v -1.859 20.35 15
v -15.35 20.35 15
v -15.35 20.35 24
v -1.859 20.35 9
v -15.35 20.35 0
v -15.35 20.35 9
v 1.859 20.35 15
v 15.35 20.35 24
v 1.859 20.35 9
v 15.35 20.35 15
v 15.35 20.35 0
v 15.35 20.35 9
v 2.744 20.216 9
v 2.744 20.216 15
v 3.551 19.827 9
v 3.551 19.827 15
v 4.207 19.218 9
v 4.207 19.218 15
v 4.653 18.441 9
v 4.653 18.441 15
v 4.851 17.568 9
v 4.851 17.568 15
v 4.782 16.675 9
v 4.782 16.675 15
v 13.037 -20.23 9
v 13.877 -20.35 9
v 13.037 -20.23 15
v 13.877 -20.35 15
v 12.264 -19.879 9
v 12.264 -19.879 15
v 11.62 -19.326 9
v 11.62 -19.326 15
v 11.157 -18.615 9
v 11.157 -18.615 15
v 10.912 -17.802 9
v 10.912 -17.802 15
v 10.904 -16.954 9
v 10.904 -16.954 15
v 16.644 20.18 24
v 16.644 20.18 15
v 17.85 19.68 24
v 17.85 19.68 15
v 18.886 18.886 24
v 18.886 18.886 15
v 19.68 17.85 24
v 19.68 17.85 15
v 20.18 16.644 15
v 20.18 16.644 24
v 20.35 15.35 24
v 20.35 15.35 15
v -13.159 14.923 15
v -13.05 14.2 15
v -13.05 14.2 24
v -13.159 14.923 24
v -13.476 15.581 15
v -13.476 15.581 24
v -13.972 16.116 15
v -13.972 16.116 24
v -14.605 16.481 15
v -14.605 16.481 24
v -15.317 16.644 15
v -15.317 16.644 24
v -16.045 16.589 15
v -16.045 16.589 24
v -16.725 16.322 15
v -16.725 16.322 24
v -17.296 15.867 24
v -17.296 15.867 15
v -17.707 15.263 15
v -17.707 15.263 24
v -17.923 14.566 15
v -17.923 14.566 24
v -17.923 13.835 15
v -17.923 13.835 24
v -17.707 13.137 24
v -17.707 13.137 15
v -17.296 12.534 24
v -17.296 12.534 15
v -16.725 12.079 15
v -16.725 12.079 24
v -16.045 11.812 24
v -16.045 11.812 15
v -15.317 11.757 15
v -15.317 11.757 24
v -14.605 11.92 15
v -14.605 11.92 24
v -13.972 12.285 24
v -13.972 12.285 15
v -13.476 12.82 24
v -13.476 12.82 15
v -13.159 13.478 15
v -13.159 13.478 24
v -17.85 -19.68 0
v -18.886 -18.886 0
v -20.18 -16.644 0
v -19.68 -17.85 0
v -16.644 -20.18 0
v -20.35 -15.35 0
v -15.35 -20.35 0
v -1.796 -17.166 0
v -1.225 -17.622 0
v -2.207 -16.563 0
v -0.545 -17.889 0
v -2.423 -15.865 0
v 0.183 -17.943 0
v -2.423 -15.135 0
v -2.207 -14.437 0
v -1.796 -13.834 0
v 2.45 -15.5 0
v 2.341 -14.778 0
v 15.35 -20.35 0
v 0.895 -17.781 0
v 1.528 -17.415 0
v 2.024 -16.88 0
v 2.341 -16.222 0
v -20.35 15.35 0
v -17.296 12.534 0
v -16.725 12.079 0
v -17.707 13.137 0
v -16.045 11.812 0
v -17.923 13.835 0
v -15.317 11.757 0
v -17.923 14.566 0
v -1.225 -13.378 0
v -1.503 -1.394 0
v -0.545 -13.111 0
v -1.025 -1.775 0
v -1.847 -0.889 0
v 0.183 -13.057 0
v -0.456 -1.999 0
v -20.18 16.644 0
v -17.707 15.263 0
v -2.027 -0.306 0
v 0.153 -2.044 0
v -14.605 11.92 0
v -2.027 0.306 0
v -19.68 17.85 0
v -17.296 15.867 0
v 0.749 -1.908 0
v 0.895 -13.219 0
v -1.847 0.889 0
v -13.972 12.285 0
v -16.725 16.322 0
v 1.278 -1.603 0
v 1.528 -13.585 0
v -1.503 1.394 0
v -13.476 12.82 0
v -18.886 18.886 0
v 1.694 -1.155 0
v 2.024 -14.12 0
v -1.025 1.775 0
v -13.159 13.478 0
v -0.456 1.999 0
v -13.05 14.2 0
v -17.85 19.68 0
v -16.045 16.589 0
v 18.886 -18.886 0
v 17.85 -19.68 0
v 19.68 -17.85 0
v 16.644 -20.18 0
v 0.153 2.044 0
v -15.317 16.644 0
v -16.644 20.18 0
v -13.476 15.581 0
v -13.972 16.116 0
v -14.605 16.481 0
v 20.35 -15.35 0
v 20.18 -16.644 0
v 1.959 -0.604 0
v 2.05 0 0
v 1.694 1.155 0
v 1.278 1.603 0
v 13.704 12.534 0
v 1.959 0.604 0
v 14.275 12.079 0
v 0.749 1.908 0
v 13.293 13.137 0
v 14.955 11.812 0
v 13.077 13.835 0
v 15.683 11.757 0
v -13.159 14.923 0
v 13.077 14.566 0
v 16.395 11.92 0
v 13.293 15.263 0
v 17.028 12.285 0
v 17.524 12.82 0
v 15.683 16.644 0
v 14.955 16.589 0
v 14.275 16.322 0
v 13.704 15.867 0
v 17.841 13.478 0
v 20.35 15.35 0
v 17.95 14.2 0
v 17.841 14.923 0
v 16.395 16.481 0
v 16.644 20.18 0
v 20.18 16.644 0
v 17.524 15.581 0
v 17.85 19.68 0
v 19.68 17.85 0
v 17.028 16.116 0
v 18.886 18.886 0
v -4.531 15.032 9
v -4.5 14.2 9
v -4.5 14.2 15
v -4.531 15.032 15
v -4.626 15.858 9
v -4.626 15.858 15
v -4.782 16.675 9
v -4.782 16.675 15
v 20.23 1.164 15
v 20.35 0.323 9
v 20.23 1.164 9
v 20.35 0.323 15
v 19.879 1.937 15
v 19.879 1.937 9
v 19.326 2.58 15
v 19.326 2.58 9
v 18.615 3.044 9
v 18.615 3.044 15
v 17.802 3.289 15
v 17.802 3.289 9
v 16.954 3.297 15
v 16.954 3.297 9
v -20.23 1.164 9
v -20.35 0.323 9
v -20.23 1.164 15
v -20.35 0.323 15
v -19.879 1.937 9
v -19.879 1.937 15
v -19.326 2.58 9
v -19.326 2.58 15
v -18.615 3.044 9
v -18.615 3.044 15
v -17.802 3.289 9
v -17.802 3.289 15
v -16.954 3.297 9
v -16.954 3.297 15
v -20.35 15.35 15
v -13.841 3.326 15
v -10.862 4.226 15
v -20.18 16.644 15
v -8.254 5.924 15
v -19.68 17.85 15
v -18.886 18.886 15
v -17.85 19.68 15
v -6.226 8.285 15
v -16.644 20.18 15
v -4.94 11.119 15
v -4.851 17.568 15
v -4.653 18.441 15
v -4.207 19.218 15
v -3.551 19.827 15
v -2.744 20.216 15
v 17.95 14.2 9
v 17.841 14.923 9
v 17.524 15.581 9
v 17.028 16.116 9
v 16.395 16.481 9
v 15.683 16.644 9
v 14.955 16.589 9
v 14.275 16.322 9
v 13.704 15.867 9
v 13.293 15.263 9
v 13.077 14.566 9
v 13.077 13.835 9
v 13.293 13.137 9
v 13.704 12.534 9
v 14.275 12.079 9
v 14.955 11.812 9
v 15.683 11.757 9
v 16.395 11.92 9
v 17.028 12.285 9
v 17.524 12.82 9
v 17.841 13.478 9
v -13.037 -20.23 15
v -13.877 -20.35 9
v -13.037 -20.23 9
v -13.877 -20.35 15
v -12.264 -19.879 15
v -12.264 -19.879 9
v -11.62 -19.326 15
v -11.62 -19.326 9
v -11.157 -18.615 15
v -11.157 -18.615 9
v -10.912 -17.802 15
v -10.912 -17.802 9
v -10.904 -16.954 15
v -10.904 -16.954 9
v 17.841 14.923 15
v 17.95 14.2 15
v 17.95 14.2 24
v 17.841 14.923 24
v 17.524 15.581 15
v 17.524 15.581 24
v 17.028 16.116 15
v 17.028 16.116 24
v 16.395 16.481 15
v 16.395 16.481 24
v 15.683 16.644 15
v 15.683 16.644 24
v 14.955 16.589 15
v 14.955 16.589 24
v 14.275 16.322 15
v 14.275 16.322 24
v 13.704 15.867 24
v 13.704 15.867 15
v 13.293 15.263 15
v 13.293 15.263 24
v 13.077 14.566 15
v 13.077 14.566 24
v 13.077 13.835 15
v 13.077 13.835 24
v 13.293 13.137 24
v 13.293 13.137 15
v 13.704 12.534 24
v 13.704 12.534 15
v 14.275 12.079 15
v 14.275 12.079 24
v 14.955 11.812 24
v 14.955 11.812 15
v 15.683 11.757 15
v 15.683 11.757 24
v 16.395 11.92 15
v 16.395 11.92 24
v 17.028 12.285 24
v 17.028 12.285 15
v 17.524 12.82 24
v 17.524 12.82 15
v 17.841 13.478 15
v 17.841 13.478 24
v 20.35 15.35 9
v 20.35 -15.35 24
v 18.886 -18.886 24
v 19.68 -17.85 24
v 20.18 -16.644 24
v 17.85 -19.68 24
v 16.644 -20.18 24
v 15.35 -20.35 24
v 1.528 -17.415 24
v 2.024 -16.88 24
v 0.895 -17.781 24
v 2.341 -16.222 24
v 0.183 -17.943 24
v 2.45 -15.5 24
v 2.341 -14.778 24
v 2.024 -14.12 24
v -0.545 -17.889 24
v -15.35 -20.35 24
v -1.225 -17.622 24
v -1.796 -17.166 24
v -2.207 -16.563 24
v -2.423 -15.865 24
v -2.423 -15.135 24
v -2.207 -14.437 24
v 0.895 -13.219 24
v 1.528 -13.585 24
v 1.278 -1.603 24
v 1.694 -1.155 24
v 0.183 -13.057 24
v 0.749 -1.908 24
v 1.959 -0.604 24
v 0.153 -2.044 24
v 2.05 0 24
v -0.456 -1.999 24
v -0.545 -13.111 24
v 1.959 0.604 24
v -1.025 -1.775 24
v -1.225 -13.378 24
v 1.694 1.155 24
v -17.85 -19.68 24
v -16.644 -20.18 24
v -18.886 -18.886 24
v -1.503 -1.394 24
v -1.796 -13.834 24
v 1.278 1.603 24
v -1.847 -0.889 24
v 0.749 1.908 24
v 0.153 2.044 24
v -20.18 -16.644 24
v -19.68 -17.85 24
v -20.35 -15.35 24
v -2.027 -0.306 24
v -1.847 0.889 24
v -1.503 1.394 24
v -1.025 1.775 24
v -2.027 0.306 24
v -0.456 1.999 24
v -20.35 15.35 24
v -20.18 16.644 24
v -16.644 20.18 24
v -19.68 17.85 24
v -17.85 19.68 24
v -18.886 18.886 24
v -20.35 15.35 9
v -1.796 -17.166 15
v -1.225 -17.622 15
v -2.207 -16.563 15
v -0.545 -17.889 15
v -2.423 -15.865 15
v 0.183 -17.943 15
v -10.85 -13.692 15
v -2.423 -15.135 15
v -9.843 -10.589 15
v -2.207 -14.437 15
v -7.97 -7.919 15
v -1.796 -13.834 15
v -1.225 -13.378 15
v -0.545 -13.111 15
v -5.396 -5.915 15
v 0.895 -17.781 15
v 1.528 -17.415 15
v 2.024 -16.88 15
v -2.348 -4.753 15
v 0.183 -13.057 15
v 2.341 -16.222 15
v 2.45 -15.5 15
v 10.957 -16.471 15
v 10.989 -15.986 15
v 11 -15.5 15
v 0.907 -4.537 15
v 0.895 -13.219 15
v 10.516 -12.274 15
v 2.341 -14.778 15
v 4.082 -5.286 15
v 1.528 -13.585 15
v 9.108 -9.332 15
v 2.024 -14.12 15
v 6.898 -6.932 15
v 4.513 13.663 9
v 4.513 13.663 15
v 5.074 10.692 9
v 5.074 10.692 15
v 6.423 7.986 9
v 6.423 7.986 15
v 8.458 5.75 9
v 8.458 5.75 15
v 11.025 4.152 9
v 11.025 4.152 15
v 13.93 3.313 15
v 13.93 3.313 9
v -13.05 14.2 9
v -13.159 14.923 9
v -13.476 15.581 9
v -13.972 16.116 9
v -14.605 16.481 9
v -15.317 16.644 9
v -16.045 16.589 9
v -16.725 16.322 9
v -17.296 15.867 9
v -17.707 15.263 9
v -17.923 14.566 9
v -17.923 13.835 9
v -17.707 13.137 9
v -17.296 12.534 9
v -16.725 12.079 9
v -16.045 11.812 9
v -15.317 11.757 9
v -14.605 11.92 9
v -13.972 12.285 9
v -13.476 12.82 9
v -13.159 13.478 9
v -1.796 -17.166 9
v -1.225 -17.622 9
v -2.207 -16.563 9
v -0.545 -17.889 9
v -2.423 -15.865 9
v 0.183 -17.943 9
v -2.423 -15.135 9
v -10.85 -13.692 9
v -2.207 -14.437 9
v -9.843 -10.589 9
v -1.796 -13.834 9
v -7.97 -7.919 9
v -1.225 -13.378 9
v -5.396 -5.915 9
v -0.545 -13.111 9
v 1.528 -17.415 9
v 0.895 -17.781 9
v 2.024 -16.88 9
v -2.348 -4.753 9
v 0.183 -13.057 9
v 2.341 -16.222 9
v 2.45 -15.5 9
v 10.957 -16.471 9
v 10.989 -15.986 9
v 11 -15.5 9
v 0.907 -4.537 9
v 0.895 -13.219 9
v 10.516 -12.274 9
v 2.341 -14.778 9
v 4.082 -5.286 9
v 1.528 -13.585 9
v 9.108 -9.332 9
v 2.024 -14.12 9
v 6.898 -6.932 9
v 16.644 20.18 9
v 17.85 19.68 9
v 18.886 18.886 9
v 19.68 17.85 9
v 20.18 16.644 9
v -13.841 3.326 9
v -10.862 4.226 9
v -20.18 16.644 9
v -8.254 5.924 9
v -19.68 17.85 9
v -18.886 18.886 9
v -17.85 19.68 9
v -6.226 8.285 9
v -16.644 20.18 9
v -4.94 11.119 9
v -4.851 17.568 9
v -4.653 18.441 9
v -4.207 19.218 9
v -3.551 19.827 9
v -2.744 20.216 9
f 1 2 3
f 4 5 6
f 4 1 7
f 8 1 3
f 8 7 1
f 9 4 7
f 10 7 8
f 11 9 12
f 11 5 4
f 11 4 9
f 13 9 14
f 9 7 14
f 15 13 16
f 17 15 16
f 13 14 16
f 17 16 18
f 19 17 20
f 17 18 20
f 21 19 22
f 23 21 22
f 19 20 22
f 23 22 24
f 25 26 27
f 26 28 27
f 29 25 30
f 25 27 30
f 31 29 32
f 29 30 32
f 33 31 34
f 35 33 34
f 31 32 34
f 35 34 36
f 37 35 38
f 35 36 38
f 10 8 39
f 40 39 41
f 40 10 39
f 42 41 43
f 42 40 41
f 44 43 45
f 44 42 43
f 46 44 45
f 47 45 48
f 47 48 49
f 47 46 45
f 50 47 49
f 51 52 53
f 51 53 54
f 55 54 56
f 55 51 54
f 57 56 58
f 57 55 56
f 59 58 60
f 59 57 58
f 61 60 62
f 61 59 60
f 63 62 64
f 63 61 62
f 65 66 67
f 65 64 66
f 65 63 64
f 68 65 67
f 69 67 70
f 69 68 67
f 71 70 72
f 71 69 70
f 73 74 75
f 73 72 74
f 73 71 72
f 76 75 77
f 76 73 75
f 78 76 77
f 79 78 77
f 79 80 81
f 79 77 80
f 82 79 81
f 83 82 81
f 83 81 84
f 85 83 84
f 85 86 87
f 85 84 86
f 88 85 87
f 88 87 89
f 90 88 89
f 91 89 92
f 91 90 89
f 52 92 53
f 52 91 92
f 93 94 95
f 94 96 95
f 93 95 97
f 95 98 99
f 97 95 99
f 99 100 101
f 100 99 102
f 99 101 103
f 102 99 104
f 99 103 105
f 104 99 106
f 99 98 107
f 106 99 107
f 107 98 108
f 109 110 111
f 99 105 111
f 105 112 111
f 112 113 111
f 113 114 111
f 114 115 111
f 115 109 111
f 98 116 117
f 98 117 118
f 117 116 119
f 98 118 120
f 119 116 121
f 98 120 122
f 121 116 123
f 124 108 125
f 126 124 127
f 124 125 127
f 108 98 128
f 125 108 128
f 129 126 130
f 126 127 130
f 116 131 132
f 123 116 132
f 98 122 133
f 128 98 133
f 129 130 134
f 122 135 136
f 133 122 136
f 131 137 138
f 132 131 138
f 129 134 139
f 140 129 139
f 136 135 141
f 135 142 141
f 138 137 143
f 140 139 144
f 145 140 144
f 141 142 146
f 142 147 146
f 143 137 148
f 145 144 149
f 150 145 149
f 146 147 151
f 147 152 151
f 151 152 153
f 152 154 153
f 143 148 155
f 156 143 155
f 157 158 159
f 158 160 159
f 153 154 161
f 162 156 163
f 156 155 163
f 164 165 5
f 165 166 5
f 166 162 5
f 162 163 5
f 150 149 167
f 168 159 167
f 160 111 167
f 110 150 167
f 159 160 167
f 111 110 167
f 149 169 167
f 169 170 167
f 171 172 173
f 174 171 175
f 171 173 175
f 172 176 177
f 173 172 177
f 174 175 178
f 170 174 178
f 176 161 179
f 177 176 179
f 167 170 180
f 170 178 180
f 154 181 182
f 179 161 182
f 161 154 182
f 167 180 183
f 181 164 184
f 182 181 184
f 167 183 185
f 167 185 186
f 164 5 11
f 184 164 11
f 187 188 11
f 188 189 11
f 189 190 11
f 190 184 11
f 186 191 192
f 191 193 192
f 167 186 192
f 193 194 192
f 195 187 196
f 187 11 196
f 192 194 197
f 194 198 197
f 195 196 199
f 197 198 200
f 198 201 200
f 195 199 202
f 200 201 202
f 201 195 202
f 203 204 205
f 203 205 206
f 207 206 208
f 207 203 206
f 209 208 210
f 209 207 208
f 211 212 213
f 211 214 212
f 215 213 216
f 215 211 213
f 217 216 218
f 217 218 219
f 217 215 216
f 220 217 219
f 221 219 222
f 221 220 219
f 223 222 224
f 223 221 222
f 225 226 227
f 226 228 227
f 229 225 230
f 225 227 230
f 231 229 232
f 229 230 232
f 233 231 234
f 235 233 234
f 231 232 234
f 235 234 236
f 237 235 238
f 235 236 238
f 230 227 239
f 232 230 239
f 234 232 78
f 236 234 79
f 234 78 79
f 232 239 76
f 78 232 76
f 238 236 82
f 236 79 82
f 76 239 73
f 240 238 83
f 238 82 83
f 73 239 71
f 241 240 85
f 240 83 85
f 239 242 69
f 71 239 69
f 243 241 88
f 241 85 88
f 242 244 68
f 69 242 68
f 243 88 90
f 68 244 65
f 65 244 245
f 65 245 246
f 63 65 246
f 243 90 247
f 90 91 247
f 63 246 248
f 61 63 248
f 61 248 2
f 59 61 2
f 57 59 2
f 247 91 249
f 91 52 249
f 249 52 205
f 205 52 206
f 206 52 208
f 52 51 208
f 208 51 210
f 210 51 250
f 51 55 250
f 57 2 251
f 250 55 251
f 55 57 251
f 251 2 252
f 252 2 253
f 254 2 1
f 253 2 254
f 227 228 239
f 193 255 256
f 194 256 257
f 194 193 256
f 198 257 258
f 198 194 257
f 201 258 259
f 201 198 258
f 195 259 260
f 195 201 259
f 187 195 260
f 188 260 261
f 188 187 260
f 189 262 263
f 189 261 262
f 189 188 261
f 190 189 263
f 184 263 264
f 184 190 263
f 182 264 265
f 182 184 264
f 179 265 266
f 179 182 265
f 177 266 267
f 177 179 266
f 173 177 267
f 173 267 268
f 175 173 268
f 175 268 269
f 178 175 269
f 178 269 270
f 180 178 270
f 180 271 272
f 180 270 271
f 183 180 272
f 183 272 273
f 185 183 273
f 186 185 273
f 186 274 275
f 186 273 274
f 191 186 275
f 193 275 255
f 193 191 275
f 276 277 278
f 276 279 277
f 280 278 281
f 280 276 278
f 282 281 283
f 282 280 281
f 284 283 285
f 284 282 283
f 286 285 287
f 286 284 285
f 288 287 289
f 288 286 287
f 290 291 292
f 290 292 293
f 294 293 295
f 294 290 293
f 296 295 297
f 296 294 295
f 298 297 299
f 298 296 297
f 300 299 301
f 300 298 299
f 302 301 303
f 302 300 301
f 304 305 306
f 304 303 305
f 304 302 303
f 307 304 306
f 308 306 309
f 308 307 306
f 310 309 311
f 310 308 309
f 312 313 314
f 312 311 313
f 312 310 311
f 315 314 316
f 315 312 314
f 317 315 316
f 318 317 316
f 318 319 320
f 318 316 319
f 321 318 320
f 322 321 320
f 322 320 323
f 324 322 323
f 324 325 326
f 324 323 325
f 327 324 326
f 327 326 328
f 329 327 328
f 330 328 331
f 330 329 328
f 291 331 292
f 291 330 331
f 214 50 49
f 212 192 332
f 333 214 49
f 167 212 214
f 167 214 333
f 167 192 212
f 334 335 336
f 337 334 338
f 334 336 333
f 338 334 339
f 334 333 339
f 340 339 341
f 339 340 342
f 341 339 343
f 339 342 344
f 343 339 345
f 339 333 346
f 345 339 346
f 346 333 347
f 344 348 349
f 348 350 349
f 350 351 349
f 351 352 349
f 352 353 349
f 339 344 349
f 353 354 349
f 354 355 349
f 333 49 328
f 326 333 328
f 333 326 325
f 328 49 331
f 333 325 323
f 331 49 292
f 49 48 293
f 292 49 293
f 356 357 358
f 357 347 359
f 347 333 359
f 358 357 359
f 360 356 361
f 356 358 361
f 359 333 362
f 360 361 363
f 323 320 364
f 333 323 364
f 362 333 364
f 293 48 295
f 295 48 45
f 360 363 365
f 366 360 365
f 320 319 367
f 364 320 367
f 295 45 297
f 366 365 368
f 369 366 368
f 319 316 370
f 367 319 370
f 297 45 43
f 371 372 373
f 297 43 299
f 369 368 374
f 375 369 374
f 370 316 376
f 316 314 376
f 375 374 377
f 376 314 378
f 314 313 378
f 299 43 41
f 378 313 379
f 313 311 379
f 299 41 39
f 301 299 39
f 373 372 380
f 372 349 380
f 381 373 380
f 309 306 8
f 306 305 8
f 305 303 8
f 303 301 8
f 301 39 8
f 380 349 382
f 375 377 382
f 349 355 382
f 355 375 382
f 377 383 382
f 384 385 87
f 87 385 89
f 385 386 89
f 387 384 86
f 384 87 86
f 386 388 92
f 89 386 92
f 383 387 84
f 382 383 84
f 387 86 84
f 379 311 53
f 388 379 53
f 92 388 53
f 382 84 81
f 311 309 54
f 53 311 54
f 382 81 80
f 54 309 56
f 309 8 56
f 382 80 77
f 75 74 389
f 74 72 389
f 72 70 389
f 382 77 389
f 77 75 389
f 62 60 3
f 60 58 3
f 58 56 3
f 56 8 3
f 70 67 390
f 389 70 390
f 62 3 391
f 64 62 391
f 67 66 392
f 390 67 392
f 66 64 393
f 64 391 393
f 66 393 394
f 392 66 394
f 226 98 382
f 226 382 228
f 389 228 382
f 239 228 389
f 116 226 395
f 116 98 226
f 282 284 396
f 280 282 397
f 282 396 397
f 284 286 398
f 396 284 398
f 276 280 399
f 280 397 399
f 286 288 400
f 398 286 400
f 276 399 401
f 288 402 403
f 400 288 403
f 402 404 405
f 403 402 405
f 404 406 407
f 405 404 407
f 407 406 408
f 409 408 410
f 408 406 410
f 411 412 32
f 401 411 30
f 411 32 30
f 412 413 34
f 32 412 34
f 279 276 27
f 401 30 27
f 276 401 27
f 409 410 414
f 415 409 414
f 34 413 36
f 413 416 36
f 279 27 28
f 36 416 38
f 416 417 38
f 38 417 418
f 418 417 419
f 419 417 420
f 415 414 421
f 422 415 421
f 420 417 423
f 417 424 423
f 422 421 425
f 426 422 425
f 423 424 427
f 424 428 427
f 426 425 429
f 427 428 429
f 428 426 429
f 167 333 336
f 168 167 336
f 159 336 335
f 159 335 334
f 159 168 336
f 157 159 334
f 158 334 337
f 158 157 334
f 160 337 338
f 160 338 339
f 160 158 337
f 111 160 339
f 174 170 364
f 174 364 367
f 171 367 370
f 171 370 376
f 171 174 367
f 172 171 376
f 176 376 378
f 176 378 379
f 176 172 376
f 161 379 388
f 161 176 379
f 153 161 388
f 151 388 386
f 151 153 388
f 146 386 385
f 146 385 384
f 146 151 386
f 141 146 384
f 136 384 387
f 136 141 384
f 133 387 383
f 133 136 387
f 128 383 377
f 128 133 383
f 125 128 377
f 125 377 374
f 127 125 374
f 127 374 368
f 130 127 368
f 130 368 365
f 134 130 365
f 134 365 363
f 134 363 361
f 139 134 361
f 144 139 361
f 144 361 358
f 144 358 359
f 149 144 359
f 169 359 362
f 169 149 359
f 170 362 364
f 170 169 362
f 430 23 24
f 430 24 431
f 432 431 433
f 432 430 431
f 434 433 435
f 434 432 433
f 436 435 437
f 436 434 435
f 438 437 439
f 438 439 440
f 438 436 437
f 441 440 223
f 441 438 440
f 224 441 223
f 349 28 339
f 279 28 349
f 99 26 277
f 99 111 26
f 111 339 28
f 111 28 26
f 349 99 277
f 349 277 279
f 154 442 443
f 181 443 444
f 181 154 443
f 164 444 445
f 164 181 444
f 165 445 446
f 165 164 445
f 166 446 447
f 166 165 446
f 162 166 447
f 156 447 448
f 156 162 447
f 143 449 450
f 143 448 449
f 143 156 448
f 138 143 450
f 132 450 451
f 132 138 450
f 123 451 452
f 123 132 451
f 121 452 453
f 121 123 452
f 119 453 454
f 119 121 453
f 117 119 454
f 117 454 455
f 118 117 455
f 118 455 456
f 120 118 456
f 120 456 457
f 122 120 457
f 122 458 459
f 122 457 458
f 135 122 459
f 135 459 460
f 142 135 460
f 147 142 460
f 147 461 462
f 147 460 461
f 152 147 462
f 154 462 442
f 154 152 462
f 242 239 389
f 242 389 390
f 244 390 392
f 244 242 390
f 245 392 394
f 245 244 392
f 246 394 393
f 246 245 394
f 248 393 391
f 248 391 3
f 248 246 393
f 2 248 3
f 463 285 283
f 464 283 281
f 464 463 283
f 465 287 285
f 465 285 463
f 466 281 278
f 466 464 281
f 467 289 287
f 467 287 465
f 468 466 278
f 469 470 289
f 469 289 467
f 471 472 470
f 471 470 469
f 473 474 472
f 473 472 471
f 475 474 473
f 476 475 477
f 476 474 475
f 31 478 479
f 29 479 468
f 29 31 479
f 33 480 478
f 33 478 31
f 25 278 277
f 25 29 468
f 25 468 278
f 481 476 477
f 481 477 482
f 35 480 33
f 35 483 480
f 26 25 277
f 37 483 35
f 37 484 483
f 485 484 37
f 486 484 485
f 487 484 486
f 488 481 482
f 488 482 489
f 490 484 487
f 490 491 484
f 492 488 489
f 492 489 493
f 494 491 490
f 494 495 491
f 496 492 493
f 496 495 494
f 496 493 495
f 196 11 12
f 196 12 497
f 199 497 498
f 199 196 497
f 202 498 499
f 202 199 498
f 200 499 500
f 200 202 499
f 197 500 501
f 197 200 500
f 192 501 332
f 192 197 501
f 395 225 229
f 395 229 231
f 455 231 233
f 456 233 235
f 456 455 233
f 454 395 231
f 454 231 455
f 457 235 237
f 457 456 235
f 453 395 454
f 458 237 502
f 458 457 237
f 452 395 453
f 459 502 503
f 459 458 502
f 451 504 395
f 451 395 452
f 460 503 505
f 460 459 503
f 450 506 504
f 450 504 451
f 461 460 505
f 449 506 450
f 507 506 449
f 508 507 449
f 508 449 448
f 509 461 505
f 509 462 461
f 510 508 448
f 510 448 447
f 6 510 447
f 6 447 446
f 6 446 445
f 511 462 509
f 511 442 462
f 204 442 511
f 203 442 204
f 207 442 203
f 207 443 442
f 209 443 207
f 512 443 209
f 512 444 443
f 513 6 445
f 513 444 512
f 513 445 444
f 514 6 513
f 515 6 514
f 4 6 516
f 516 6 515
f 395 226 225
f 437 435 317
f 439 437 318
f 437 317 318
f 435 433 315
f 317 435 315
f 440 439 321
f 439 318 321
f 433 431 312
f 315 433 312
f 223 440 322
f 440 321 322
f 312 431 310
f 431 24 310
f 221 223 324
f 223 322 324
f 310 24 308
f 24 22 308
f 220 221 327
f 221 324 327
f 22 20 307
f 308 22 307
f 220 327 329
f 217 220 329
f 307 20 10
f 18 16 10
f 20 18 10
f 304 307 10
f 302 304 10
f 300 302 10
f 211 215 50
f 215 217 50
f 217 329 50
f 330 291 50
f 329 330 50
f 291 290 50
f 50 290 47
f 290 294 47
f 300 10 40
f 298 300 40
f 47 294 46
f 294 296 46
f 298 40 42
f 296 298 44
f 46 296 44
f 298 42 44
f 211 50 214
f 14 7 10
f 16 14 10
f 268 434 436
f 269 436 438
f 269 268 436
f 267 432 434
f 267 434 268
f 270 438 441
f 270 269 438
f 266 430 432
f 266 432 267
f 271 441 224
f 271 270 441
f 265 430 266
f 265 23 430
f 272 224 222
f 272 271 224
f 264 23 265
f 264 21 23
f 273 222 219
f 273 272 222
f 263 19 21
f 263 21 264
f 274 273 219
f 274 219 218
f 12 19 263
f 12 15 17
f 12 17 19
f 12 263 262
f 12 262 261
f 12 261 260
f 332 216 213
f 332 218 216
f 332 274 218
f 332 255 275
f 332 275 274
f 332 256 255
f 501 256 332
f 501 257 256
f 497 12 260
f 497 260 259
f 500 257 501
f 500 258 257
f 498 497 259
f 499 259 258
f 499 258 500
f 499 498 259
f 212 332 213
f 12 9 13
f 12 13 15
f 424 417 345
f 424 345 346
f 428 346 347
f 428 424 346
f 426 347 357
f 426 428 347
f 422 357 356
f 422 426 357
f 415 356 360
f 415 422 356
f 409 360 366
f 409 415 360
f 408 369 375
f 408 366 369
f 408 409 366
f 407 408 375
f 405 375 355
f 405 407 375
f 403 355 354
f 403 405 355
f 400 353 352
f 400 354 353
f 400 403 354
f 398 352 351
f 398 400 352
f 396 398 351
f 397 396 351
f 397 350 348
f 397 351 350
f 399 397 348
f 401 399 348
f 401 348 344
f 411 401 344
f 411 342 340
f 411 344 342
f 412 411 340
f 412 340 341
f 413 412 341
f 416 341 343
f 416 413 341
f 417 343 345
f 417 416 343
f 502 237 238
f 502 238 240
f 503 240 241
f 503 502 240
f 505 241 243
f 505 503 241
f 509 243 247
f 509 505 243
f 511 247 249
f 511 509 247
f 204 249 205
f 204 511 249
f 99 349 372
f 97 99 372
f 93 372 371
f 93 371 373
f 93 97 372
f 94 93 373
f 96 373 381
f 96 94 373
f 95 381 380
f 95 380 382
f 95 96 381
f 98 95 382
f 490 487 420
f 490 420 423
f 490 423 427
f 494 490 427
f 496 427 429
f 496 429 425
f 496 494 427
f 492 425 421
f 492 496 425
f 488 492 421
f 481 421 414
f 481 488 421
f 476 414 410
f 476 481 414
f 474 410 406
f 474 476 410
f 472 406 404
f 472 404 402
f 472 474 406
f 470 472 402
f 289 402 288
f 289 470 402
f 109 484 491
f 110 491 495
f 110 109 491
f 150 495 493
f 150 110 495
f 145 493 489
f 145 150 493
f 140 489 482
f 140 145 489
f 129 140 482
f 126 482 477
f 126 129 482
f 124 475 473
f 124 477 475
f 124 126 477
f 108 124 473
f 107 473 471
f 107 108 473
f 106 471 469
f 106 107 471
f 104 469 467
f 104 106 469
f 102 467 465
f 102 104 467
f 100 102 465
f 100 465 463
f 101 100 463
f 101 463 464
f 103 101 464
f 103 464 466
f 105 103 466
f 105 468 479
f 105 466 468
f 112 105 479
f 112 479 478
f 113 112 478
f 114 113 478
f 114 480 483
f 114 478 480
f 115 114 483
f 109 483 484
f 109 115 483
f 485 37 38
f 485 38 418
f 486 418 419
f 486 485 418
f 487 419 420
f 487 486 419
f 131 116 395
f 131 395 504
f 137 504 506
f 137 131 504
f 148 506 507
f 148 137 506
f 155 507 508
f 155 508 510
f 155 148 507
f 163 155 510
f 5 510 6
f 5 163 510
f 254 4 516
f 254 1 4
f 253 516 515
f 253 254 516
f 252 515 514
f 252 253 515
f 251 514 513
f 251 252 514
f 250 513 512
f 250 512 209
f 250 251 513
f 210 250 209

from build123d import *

# Parameters (mm, degrees)
SKETCH1_R           = 2.05
BOSS_EXTRUDE1_DEPTH = 24
CUT_EXTRUDE1_START  = 15
SKETCH1_4_R         = 11
CUT_EXTRUDE1_DEPTH  = 6
SKETCH1_5_R         = 2.45
CUT_EXTRUDE3_DEPTH  = 44
FILLET1_R           = 3


with BuildPart() as part:
    # Sketch1 → Boss-Extrude1 (new body)
    with BuildSketch(Plane.XY):
        with BuildLine():
            ThreePointArc((-20.35, -15.35), (-18.885533906, -18.885533906), (-15.35, -20.35))
            Line((-15.35, -20.35), (15.35, -20.35))
            ThreePointArc((15.35, -20.35), (18.885533906, -18.885533906), (20.35, -15.35))
            Line((20.35, -15.35), (20.35, 15.35))
            ThreePointArc((20.35, 15.35), (18.885533906, 18.885533906), (15.35, 20.35))
            Line((15.35, 20.35), (-15.35, 20.35))
            ThreePointArc((-15.35, 20.35), (-18.885533906, 18.885533906), (-20.35, 15.35))
            Line((-20.35, 15.35), (-20.35, -15.35))
        make_face()
        Circle(SKETCH1_R, mode=Mode.SUBTRACT)
    extrude(amount=BOSS_EXTRUDE1_DEPTH)

    # Sketch1<4> → Cut-Extrude1 (cut)
    with BuildSketch(Plane.XY.offset(CUT_EXTRUDE1_START)):
        with Locations((0, -15.5)):
            Circle(SKETCH1_4_R)
        with Locations((-15.5, 14.200476627)):
            Circle(SKETCH1_4_R)
        with Locations((15.5, 14.200476627)):
            Circle(SKETCH1_4_R)
    extrude(amount=-CUT_EXTRUDE1_DEPTH, mode=Mode.SUBTRACT)

    # Sketch1<5> → Cut-Extrude3 (cut)
    with BuildSketch(Plane.XY):
        with Locations((-15.5, 14.200476627)):
            Circle(SKETCH1_5_R)
        with Locations((15.5, 14.200476627)):
            Circle(SKETCH1_5_R)
        with Locations((0, -15.5)):
            Circle(SKETCH1_5_R)
    extrude(amount=CUT_EXTRUDE3_DEPTH, mode=Mode.SUBTRACT)

    # Fillet1
    fillet1_edges = [part.edges().sort_by_distance(p)[0] for p in [
        (-9.873069432, -20.35, 12),
        (9.873069432, -20.35, 12),
        (-20.35, 4.327407195, 12),
        (20.35, 4.327407195, 12),
        (-6.37950866, 20.35, 12),
        (6.37950866, 20.35, 12),
    ]]
    fillet(fillet1_edges, radius=FILLET1_R)


solid = part.part
